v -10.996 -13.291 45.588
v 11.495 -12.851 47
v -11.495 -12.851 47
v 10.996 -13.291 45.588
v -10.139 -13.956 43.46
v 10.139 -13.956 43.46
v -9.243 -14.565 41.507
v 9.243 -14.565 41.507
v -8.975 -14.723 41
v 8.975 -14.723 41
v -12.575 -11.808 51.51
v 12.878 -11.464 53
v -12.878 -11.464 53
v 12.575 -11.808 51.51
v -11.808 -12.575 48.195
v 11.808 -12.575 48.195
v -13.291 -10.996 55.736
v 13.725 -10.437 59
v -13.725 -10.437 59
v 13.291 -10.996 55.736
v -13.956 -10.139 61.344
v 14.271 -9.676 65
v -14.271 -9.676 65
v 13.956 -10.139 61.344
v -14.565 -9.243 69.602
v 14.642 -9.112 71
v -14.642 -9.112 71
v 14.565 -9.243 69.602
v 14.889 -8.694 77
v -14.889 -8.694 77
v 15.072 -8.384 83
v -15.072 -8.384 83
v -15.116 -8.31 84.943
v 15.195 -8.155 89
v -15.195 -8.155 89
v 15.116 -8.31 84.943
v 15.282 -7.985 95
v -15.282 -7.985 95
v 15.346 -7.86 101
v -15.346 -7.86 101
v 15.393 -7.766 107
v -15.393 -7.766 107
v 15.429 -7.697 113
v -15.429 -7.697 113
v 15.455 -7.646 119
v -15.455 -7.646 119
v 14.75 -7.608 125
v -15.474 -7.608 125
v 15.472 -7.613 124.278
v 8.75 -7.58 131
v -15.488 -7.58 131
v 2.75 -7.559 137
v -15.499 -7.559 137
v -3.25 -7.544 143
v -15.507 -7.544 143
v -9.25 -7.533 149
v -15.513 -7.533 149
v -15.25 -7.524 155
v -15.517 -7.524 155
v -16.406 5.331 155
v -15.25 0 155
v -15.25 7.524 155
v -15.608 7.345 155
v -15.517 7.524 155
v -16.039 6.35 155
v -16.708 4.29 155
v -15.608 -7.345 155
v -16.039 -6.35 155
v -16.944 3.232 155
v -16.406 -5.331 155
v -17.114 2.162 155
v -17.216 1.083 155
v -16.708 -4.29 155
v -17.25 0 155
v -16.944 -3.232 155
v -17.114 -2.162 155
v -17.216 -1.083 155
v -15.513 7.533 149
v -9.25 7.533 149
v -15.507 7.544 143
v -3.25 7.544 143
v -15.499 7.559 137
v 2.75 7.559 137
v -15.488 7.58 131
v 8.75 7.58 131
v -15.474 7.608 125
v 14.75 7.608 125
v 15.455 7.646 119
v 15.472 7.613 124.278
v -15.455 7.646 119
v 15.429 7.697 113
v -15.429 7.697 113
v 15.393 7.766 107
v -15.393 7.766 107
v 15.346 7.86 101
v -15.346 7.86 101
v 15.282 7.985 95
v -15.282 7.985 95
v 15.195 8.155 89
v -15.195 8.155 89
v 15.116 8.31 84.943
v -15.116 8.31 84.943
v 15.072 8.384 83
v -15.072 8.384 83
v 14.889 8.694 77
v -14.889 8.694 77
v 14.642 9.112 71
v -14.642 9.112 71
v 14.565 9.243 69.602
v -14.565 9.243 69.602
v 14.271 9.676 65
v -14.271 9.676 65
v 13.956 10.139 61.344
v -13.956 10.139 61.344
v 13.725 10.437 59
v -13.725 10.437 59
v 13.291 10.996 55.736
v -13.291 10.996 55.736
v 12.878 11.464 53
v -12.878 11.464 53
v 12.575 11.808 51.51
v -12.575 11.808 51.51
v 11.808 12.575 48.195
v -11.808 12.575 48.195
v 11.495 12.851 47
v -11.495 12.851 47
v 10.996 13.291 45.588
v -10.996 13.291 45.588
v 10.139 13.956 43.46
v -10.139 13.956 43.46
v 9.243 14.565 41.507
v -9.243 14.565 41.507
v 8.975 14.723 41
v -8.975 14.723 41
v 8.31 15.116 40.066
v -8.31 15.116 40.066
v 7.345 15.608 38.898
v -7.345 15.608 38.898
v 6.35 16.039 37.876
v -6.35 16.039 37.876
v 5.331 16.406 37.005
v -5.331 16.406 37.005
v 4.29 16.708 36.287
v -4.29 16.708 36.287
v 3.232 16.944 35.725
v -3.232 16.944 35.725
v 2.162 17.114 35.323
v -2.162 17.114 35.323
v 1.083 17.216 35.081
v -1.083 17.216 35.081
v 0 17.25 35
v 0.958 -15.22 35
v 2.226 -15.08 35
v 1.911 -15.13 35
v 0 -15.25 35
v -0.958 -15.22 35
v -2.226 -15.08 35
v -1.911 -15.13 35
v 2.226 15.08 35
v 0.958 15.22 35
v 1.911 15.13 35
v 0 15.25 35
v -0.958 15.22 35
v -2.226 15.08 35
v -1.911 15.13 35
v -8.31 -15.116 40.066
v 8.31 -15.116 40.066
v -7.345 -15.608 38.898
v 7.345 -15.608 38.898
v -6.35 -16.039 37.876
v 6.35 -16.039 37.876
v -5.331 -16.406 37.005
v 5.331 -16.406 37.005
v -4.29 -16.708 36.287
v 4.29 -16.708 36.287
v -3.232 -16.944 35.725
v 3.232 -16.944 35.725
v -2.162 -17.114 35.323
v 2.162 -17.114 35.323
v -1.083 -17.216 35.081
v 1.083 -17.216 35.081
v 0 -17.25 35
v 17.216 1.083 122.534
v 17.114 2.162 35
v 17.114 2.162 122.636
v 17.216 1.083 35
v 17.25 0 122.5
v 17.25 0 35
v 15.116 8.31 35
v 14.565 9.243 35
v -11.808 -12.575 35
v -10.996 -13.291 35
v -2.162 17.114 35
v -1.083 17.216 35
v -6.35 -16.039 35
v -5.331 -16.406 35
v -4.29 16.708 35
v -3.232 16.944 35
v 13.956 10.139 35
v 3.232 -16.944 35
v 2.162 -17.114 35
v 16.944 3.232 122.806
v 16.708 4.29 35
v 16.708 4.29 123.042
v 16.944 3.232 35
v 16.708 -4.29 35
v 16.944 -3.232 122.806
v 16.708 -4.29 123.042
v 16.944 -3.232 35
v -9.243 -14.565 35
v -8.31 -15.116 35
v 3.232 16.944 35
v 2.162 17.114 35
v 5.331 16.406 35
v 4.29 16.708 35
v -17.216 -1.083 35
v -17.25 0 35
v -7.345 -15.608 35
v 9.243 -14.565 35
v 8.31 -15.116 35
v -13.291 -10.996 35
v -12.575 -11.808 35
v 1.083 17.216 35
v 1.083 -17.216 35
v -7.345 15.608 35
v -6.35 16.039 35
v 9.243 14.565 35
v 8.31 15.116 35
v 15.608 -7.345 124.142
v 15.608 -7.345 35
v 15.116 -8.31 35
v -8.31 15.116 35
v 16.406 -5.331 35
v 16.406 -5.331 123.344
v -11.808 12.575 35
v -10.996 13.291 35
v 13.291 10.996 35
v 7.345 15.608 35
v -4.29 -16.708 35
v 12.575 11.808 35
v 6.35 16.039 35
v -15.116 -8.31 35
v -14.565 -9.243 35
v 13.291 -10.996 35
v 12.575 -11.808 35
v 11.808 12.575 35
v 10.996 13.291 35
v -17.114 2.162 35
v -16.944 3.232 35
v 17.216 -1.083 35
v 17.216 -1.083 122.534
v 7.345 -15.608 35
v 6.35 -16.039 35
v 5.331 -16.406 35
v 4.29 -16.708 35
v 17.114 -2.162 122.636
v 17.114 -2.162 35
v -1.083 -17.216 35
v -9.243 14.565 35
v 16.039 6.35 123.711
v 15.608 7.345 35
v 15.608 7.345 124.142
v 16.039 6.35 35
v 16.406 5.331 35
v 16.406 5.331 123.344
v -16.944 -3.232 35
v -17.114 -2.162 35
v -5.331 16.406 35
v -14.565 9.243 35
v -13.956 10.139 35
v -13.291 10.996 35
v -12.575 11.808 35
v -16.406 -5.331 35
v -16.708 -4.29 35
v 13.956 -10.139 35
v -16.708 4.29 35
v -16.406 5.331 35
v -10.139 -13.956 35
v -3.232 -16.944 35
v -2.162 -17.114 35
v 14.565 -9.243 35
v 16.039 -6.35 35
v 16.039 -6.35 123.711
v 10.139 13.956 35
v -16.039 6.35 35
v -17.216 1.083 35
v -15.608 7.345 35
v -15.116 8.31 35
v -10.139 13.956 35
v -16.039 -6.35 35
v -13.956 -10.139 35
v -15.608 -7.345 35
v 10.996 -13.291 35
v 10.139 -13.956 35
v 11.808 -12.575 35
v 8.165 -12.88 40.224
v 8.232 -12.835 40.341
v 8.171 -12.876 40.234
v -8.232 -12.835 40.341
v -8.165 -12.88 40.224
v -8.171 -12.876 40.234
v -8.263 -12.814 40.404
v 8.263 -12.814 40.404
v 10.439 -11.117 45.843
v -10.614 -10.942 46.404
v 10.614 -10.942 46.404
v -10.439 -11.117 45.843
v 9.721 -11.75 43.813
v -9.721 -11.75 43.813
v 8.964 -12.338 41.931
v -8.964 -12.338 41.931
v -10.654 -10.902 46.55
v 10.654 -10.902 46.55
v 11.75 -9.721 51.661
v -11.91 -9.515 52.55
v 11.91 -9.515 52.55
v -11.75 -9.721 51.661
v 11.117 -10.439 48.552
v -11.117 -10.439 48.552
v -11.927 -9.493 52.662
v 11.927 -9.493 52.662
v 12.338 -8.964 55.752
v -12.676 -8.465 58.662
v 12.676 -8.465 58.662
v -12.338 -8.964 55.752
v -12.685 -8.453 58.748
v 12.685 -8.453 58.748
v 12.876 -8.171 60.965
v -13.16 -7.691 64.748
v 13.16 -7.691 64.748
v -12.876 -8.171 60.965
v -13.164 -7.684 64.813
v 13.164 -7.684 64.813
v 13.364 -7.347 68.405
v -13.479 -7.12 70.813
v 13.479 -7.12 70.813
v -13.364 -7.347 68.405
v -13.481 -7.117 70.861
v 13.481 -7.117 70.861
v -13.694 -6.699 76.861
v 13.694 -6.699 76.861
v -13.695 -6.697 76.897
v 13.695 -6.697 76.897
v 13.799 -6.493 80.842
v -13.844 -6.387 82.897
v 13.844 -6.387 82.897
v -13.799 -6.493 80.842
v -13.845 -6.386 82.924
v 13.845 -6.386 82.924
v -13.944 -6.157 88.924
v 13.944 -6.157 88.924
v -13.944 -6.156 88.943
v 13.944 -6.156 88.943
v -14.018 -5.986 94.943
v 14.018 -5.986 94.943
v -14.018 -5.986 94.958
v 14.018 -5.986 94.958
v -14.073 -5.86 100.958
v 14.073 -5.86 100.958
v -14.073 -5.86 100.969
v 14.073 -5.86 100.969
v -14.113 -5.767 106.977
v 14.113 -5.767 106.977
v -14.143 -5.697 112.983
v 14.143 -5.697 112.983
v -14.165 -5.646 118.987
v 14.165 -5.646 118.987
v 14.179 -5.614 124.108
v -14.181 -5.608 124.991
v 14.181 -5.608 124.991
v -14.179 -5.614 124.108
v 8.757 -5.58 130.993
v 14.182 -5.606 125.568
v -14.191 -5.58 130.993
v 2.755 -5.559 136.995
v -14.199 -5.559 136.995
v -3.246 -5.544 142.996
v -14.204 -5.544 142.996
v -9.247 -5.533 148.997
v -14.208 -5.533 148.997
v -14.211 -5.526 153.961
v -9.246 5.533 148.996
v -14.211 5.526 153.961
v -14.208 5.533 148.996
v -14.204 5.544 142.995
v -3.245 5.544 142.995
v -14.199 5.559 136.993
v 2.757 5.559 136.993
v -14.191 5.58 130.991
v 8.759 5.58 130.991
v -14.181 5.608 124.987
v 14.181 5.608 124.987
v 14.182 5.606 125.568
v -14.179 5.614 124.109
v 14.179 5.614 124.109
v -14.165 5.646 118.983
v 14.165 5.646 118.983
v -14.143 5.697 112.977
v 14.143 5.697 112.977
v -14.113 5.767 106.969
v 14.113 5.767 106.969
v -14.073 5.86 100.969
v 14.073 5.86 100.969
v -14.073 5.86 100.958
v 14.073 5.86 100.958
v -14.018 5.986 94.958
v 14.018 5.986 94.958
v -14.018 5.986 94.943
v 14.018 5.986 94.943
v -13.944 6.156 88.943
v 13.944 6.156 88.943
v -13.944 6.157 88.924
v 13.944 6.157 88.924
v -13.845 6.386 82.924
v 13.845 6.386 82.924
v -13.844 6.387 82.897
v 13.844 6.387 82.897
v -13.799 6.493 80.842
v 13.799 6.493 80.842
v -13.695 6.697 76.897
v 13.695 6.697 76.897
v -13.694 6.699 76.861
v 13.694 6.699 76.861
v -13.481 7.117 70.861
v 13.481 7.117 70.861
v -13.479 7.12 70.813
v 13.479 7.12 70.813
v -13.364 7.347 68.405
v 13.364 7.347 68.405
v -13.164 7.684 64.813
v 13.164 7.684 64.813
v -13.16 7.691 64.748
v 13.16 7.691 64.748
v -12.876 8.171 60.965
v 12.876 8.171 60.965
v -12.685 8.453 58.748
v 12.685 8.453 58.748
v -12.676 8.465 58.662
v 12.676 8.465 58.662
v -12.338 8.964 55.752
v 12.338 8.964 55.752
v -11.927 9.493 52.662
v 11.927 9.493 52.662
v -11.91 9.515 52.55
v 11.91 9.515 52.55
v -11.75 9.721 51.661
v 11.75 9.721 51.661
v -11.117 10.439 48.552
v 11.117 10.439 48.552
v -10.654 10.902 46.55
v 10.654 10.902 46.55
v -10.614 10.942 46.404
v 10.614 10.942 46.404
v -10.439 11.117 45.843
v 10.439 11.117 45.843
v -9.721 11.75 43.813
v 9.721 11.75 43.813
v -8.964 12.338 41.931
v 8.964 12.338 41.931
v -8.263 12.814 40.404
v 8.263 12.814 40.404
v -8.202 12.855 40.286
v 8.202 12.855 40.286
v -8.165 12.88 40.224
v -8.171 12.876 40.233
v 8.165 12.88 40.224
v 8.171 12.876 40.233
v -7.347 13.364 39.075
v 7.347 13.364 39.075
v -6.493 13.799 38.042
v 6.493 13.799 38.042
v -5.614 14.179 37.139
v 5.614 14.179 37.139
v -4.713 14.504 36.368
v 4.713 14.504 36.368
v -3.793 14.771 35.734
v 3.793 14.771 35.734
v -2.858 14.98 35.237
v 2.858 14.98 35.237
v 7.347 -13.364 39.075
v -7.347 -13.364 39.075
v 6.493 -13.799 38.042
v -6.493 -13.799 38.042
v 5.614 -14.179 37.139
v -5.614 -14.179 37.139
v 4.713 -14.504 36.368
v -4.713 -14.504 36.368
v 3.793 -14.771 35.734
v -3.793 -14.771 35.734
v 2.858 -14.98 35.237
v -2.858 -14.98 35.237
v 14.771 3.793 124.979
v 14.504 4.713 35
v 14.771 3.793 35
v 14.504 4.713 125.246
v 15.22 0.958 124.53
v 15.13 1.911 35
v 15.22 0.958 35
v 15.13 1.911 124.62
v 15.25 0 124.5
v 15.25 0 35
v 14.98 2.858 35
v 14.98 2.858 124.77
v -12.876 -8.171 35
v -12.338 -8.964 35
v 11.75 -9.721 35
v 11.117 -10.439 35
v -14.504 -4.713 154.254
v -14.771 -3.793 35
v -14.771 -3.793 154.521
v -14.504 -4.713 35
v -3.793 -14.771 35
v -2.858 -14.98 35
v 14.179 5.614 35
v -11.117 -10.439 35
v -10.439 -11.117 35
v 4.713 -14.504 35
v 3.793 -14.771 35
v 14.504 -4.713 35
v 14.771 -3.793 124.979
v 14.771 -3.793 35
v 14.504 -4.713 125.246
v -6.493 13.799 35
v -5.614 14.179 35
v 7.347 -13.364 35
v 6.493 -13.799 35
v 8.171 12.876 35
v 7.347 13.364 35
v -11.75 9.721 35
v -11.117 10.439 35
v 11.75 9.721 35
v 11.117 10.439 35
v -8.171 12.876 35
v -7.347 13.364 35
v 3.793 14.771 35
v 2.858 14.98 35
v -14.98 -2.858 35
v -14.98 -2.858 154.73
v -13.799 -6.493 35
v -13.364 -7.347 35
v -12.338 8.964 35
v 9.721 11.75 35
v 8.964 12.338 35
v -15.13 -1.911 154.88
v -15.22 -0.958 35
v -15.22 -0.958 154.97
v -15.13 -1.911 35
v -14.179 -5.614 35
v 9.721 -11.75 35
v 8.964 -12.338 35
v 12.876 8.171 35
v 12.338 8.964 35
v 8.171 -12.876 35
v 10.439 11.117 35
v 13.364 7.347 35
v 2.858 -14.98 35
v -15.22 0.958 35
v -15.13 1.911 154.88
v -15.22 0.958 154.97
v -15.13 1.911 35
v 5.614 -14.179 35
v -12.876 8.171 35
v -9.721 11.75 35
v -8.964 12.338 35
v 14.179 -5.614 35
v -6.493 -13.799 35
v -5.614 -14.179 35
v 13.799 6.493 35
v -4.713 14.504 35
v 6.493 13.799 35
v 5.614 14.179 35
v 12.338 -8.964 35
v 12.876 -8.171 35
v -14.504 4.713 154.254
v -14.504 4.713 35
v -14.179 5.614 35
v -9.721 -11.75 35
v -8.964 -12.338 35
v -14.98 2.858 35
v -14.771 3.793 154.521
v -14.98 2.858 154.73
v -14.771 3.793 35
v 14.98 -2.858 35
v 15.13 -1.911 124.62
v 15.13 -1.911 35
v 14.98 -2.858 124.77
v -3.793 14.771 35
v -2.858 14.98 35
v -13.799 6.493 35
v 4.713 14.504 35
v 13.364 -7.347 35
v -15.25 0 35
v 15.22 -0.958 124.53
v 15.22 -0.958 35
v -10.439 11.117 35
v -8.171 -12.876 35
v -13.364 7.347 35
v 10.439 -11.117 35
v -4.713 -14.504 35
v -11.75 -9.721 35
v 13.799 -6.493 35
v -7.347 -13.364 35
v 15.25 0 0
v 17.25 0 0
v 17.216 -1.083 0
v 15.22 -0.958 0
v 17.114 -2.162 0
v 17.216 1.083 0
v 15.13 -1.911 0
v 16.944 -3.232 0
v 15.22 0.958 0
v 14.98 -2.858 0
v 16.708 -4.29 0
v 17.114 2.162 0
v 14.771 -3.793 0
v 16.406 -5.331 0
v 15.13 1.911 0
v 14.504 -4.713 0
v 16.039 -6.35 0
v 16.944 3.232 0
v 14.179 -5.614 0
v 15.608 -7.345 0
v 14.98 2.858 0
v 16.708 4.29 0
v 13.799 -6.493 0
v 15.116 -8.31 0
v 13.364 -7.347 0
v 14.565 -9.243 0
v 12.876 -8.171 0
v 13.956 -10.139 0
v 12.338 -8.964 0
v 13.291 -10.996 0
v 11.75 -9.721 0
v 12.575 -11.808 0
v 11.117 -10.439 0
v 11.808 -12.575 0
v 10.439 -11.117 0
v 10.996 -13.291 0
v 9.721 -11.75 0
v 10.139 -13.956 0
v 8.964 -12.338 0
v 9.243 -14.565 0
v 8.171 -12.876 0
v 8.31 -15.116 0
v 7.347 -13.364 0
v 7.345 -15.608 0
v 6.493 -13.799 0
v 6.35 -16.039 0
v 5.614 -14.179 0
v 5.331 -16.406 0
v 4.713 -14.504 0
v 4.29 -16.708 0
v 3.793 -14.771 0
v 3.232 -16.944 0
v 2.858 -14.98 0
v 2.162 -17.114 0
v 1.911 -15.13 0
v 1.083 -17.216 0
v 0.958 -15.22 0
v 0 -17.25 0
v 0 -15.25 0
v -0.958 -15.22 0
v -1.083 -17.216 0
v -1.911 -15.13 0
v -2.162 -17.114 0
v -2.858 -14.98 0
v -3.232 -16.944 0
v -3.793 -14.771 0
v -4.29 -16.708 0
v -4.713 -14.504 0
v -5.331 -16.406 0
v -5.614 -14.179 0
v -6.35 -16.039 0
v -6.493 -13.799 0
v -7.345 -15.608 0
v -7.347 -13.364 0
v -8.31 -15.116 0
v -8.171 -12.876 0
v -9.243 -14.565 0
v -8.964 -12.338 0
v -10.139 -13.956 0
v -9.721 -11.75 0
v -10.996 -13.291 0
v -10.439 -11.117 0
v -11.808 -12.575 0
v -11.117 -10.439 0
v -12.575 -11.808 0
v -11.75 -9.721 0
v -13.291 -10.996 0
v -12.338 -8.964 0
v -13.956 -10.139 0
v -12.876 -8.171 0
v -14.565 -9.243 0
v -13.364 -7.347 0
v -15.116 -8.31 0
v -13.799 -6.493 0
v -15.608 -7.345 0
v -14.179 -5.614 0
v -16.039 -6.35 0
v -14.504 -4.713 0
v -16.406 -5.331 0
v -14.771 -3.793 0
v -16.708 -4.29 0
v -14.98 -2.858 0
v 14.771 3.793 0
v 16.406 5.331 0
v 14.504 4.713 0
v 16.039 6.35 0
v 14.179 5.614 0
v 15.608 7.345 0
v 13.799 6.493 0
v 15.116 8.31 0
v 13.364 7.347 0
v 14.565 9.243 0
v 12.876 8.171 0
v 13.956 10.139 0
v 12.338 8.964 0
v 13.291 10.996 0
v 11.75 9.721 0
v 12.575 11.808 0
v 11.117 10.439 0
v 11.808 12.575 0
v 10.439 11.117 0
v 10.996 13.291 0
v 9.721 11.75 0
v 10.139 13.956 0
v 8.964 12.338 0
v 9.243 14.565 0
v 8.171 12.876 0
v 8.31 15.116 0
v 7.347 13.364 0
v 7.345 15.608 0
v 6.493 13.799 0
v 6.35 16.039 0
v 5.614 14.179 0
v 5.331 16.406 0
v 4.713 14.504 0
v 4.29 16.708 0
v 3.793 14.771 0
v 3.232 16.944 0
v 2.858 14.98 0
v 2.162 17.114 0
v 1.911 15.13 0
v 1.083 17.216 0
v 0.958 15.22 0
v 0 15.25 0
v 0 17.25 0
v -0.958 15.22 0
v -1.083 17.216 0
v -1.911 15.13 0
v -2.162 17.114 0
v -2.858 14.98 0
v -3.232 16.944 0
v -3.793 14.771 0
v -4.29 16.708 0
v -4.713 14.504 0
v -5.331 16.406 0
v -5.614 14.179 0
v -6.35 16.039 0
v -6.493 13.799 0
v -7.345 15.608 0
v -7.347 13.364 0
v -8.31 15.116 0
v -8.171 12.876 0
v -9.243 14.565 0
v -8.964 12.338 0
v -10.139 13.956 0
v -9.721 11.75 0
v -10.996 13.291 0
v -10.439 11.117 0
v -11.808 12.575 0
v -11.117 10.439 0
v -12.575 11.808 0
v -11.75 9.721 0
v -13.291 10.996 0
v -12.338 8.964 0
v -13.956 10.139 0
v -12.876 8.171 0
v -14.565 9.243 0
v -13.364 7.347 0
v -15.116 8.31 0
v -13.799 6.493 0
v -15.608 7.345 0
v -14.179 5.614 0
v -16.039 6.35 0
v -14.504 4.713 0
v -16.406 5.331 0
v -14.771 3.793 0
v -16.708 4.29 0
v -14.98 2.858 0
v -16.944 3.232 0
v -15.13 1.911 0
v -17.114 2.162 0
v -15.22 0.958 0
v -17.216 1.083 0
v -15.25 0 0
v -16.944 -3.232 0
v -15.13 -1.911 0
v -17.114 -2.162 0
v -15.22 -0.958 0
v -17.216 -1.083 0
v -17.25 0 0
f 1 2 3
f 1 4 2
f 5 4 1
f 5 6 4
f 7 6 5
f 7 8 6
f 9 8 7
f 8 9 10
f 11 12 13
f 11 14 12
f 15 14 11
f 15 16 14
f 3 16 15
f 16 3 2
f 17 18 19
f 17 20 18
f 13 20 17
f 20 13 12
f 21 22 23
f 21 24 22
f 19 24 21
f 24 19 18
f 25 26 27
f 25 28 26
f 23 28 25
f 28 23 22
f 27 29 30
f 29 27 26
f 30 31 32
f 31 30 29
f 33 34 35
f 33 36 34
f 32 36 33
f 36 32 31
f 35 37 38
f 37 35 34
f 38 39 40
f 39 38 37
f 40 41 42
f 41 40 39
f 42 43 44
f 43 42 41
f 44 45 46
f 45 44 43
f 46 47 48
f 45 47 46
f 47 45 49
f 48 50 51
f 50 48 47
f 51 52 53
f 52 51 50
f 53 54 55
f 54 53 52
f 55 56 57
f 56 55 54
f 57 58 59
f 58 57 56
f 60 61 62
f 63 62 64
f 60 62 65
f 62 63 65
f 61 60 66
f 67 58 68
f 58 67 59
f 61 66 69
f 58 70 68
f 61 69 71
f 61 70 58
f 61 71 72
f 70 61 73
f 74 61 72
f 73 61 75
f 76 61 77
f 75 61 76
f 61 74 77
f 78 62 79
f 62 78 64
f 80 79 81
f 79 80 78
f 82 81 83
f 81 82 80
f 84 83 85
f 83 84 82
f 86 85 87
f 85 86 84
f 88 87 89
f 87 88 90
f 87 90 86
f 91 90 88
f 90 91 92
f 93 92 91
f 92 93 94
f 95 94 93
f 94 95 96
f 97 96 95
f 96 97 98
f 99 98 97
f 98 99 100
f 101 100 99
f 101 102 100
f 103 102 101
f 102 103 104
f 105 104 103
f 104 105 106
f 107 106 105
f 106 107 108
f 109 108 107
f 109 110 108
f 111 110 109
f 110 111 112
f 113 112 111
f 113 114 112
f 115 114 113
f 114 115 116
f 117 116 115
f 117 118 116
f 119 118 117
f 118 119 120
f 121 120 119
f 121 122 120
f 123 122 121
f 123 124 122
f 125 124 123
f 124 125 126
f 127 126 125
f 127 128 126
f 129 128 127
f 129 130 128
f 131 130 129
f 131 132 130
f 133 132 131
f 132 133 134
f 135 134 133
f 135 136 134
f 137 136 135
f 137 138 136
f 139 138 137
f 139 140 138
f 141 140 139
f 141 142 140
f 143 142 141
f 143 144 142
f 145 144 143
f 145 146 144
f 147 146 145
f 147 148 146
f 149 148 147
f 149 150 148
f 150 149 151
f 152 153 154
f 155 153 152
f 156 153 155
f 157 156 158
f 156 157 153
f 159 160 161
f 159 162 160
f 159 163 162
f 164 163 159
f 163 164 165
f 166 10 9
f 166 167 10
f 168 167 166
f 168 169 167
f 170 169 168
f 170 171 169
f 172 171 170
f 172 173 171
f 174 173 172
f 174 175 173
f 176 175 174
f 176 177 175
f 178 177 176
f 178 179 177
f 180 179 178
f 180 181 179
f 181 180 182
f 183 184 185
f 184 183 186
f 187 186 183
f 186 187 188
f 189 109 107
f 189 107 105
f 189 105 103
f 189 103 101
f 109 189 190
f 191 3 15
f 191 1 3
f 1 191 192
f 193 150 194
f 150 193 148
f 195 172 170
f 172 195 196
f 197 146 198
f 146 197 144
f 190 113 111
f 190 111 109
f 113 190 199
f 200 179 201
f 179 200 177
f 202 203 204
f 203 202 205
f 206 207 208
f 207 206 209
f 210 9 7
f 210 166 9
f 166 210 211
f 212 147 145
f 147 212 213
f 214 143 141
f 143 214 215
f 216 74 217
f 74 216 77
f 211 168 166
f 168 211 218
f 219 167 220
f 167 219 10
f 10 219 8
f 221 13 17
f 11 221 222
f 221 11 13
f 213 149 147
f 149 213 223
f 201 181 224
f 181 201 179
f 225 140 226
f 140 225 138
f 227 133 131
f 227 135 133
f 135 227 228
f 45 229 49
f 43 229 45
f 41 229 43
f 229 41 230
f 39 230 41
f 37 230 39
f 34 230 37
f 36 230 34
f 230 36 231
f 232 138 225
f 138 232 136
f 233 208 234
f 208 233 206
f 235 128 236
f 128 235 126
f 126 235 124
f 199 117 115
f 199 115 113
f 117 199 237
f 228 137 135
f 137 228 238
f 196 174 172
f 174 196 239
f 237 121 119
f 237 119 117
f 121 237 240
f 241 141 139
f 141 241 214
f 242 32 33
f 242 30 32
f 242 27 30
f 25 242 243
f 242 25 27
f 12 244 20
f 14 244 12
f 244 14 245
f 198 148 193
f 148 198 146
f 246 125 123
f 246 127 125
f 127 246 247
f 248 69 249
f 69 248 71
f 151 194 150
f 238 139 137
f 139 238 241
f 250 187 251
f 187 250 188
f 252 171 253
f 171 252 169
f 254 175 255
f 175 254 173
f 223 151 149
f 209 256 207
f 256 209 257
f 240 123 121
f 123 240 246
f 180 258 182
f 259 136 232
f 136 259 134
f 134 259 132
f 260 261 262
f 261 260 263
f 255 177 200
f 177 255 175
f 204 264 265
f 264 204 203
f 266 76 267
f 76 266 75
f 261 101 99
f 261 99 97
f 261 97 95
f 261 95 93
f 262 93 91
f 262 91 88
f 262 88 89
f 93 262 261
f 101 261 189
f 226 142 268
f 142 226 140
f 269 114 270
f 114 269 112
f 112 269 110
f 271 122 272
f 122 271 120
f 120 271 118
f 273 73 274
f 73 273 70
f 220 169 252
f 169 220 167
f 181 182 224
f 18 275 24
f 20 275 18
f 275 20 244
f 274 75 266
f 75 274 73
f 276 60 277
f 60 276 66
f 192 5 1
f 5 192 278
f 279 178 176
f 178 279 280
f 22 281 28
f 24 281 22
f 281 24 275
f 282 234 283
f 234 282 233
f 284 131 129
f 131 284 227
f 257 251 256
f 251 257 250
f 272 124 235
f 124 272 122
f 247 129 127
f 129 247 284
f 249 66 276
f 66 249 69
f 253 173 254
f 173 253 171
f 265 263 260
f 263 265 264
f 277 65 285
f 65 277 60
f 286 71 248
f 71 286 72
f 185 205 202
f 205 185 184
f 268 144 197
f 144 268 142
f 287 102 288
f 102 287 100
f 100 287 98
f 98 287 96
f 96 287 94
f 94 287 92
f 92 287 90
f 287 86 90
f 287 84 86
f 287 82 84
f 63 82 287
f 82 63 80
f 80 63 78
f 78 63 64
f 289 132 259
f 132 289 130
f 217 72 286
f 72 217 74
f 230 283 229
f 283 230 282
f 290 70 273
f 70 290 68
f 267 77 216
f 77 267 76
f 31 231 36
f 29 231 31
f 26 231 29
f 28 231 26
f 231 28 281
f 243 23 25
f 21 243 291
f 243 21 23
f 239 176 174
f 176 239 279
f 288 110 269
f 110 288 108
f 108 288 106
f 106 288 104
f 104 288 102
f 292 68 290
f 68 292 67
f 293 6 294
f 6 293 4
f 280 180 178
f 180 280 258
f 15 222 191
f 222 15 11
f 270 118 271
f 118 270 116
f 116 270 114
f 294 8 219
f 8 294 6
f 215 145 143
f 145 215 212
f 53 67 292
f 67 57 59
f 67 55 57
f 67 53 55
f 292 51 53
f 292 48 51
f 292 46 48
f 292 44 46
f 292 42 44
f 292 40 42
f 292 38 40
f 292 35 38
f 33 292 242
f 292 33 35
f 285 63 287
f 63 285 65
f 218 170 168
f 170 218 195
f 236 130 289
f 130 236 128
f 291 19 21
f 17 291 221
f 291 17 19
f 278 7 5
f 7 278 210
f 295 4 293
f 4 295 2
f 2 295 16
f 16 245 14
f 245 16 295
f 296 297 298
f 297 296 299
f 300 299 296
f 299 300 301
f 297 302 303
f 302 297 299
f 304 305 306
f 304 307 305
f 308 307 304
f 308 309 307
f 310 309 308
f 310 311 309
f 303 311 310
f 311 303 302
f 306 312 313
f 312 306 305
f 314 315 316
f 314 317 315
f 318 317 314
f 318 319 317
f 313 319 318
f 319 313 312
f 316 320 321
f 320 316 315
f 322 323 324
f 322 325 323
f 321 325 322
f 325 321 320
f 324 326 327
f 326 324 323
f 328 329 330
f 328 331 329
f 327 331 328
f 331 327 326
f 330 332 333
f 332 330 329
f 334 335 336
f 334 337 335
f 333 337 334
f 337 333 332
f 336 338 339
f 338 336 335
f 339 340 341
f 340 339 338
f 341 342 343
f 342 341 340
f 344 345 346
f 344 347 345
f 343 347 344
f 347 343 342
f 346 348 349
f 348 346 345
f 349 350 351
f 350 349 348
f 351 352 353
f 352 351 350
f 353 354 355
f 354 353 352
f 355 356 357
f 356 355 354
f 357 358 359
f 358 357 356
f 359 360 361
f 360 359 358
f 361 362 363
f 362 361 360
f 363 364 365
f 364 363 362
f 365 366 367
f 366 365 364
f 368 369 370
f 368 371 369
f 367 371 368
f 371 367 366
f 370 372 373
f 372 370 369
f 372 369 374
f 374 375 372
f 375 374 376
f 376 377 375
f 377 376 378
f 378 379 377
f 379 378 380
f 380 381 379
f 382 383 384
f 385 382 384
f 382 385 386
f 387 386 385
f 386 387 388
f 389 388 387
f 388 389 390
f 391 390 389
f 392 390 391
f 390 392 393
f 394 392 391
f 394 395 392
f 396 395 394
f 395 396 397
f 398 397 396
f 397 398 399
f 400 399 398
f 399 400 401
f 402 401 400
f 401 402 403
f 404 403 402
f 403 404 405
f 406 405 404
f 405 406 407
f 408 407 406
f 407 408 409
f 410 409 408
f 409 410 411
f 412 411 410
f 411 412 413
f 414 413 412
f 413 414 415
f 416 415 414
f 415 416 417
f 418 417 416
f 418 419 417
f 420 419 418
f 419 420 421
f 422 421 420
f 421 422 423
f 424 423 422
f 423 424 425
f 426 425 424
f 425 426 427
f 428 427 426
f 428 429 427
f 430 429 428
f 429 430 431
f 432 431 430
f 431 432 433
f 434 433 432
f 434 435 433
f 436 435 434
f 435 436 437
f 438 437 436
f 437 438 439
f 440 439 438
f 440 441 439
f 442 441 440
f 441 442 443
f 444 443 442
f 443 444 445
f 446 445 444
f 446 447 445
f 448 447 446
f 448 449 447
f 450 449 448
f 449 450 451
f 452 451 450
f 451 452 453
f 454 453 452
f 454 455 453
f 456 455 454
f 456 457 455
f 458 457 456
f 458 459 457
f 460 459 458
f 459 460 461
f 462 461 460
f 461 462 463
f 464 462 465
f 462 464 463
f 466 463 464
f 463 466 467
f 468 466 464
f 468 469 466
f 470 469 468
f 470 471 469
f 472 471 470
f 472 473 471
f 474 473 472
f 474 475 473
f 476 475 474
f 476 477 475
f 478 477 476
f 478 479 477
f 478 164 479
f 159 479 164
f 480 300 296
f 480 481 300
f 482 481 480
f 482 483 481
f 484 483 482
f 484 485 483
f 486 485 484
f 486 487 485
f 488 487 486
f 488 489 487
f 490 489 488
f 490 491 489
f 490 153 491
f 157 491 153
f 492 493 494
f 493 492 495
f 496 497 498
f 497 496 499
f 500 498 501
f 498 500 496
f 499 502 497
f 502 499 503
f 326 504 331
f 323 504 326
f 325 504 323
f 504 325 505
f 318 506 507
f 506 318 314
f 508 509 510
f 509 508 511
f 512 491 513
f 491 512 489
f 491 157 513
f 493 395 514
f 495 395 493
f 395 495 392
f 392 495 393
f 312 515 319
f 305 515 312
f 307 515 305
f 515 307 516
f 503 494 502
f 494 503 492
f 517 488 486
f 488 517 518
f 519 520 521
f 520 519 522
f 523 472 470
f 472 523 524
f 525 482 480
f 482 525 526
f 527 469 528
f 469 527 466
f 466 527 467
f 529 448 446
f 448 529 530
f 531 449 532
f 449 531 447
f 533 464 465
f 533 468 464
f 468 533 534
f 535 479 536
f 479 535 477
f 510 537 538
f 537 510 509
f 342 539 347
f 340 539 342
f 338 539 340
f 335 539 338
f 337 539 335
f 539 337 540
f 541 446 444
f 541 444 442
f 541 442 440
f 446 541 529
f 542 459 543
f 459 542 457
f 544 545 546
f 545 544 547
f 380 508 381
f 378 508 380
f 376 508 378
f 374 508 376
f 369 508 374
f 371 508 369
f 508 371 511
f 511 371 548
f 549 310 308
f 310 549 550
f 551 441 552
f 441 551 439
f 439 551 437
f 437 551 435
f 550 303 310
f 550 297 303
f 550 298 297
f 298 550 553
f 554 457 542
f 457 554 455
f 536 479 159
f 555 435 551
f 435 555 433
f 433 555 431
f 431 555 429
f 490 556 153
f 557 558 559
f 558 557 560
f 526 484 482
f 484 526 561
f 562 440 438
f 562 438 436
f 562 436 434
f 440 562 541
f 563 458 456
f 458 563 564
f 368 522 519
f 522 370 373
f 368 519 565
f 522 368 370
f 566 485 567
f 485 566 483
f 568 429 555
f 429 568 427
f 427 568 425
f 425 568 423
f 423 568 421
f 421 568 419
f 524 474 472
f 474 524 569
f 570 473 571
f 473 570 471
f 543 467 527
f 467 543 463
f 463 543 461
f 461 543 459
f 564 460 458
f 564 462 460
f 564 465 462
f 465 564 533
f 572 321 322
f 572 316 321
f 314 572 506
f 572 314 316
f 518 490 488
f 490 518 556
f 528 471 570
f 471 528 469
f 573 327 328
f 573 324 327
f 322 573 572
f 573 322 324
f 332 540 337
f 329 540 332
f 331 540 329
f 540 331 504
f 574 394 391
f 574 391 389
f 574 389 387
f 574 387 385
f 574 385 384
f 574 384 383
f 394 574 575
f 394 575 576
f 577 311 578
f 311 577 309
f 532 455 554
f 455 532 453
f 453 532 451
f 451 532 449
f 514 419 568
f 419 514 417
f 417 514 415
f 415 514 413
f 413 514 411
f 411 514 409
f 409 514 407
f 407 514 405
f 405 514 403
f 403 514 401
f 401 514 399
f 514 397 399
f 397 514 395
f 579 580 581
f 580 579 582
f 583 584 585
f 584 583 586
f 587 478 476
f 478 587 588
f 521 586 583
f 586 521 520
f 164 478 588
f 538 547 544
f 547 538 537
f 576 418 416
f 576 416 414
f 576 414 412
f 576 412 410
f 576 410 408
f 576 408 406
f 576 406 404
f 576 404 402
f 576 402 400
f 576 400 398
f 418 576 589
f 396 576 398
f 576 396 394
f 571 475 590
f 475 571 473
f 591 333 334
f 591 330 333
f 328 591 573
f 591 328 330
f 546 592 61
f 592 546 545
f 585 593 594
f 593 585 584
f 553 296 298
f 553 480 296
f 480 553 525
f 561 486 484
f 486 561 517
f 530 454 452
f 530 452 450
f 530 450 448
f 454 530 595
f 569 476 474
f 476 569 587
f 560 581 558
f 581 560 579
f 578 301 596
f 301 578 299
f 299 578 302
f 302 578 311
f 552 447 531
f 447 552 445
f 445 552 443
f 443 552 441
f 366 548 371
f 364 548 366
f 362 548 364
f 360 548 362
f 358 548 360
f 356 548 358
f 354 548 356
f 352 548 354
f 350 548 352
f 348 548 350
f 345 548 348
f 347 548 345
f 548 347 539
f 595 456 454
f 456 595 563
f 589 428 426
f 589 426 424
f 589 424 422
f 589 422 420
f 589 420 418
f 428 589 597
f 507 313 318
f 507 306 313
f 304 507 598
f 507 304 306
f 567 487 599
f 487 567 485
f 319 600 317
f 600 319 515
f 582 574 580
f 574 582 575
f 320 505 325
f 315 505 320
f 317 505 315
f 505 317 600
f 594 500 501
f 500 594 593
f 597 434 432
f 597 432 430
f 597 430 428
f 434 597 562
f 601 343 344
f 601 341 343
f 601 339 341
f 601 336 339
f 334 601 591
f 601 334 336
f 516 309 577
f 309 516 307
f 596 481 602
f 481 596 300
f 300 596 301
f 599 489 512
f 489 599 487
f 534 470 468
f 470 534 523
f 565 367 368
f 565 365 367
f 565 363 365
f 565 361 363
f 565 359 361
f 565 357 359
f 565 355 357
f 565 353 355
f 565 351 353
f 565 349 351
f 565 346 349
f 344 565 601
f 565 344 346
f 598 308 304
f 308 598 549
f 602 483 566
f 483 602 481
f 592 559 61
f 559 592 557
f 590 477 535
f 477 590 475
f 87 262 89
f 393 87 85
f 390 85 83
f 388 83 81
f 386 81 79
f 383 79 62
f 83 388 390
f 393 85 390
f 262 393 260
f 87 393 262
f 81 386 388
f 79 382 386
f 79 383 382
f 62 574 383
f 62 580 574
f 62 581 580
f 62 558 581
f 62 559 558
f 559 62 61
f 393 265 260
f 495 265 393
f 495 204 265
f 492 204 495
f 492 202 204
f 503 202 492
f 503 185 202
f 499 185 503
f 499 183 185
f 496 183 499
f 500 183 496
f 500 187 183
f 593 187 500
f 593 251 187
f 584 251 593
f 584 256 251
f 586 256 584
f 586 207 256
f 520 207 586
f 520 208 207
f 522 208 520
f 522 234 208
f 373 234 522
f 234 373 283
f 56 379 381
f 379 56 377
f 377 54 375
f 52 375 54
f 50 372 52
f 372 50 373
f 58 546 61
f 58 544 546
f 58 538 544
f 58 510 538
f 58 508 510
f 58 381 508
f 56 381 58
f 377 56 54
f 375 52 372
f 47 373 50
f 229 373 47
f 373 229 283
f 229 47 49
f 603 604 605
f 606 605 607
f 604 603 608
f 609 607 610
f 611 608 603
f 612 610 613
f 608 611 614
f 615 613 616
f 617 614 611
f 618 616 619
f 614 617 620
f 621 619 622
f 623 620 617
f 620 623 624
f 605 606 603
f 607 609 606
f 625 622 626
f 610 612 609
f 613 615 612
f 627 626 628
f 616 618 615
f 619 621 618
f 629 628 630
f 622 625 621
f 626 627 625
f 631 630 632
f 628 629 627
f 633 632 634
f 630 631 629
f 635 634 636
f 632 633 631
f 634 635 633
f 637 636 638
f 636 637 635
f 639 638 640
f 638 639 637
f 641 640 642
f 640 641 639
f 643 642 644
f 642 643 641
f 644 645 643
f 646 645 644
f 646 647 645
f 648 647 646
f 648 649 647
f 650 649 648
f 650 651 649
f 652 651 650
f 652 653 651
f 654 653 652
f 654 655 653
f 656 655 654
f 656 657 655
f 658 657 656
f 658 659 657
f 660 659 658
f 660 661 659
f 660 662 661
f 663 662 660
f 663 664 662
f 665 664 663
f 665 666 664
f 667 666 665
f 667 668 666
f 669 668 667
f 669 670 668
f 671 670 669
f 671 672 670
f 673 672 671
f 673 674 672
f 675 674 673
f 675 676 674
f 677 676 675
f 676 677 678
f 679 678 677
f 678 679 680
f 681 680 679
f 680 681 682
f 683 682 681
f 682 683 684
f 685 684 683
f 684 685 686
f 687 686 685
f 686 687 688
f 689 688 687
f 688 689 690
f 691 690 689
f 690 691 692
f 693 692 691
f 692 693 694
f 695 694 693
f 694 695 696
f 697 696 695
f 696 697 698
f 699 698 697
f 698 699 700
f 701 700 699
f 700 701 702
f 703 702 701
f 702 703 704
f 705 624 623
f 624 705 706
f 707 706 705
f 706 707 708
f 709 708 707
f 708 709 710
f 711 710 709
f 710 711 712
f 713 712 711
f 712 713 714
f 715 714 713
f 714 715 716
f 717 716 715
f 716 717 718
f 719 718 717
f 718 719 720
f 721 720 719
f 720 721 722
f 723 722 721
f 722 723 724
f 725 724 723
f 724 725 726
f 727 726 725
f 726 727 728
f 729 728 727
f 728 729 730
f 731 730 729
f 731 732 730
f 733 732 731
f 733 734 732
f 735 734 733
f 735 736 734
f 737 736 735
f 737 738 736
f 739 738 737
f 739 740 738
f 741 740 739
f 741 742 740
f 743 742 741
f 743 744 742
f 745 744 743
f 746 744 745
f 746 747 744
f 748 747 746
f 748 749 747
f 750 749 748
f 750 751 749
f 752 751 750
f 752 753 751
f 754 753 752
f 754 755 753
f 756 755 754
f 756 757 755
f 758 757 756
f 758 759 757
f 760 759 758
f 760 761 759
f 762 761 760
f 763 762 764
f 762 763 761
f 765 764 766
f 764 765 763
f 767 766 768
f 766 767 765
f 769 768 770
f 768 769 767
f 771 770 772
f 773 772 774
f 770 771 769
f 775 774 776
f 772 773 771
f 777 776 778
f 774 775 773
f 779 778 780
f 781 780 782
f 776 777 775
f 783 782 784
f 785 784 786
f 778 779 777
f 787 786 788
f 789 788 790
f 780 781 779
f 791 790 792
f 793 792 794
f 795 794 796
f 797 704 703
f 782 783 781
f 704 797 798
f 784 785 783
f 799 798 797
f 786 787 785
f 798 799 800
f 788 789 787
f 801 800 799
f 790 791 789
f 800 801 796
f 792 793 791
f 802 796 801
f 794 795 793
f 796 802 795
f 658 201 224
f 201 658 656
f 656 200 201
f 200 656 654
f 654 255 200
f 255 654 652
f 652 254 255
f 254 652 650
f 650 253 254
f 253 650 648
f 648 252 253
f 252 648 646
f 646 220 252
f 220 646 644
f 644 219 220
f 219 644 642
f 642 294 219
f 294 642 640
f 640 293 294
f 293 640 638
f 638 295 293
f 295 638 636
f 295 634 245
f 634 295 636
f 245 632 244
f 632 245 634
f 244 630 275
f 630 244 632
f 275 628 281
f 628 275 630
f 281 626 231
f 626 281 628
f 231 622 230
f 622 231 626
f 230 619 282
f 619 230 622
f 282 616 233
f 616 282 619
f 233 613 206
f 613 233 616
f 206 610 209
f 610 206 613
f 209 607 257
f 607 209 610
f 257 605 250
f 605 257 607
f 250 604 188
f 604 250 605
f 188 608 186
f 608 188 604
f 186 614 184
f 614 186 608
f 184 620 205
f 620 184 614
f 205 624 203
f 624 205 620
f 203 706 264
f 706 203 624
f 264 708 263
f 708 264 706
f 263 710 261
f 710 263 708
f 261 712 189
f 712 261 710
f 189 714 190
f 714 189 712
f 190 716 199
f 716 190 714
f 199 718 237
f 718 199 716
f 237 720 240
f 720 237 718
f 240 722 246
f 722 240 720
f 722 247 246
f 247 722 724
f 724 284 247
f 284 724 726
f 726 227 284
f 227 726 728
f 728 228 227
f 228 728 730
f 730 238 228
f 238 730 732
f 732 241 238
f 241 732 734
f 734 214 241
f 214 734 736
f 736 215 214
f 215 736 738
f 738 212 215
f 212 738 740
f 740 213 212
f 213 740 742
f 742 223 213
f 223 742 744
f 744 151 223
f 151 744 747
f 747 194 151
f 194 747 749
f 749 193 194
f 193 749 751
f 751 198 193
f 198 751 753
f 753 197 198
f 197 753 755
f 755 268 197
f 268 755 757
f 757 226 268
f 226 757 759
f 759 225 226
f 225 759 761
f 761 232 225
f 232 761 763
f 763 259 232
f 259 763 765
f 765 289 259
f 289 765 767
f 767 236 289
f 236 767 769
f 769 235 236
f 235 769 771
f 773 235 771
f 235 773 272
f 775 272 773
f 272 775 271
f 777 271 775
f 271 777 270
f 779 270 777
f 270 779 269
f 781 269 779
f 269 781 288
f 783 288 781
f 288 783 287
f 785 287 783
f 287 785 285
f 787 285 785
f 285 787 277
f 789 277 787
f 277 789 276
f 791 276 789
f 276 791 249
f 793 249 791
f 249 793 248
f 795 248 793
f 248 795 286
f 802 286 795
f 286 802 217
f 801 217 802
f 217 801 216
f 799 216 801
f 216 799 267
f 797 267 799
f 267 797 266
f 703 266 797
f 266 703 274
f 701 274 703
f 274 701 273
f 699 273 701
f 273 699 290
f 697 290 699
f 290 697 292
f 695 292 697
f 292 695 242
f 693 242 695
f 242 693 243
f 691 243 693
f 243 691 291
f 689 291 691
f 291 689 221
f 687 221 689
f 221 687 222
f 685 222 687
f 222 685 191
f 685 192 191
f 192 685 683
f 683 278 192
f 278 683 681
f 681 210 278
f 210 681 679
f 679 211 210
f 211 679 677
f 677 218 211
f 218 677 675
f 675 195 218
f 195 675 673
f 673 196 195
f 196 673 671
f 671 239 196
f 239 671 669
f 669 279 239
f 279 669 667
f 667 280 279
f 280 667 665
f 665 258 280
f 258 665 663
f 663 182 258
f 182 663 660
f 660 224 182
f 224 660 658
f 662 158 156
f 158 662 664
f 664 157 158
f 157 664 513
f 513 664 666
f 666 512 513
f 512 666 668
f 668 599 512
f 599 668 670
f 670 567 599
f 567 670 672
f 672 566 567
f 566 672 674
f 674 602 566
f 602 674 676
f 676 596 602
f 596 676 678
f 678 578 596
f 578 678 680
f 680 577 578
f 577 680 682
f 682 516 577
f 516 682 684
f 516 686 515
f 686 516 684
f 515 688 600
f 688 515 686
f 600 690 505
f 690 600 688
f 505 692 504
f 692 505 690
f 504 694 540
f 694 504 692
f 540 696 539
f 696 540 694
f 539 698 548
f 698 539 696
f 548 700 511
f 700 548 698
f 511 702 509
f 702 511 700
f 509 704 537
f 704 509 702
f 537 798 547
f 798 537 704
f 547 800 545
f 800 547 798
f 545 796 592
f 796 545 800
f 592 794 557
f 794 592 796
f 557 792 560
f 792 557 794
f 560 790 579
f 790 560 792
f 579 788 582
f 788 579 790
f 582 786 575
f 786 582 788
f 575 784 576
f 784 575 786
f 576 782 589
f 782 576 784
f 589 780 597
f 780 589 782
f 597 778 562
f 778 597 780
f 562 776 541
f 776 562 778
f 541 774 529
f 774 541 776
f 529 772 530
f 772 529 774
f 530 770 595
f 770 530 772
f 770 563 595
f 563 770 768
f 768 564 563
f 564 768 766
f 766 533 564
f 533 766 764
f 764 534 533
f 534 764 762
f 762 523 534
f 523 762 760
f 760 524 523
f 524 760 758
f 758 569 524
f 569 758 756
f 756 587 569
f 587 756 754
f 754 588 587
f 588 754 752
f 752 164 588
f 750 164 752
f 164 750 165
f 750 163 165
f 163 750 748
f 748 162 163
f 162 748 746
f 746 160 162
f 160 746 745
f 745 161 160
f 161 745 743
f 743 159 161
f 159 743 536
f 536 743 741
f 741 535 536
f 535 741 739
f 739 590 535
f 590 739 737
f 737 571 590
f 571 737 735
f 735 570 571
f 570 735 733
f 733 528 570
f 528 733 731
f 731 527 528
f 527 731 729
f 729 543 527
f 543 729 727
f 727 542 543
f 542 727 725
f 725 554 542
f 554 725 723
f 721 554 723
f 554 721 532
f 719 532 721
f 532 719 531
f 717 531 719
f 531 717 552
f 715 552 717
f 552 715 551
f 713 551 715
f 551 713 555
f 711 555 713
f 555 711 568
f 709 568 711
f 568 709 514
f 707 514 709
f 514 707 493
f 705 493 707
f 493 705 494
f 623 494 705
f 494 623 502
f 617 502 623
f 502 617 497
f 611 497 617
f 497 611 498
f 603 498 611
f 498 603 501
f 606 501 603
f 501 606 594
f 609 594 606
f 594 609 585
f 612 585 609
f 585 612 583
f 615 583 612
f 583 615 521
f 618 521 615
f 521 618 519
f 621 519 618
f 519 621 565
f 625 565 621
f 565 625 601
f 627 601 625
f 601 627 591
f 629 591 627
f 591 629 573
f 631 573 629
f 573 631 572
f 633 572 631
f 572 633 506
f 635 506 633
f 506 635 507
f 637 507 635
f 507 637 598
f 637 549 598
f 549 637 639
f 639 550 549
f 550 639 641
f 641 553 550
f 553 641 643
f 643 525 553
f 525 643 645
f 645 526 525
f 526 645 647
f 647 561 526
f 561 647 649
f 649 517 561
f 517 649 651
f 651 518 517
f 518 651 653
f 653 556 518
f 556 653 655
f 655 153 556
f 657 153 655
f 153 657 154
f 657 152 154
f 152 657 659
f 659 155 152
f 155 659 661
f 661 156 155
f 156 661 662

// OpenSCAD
$fn = 100;
mm = 1;
e = 2.71828;
eps = 0.1 * mm;

attachment_outer_dia = 34.5 * mm;
attachment_height = 35 * mm;
wall_width = 2 * mm;

taper_height = 120 * mm;
nozzle_width = 15 * mm;
nozzle_angle = 45;

attachment_inner_dia = attachment_outer_dia - 2 * wall_width;
total_height = attachment_height + taper_height;

taper_steps = 20;

function taper_point(x, y) = [
    x * taper_height, y *(nozzle_width / 2 + (attachment_outer_dia - nozzle_width) / 2 * (e ^ -(6 * x)))
];

module taper_profile()
{
    taper_points = [
        for (i = [0:taper_steps]) taper_point(i / taper_steps, 1),
        for (i = [0:taper_steps]) taper_point((taper_steps - i) / taper_steps, -1),
    ];
    echo(taper_points);
    polygon(taper_points);
}

module nozzle()
{
    difference()
    {
        intersection()
        {
            translate([ attachment_outer_dia / 2, 0, 0 ]) rotate([ 0, -90, 0 ]) linear_extrude(attachment_outer_dia)
                taper_profile();
            cylinder(d = attachment_outer_dia, h = taper_height);
        }
        intersection()
        {
            translate([ attachment_inner_dia / 2, 0, 0 ]) rotate([ 0, -90, 0 ]) linear_extrude(attachment_inner_dia)
                offset(r = -wall_width)
            {
                taper_profile();
                translate([ -wall_width - eps, -attachment_outer_dia / 2 ])
                    square([ wall_width + 2 * eps, attachment_outer_dia ]);
                translate([ taper_height - eps, -nozzle_width / 2 ]) square([ wall_width + 2 * eps, nozzle_width ]);
            }
            cylinder(d = attachment_inner_dia, h = taper_height);
        }

        translate([ -attachment_outer_dia / 2, 0, taper_height ]) hull()
        {
            translate([ wall_width, -attachment_outer_dia / 2, 0 ])
                cube([ wall_width, attachment_outer_dia, taper_height ]);
            translate([
                attachment_outer_dia, -attachment_outer_dia / 2,
                -(attachment_outer_dia - wall_width) * tan(nozzle_angle)
            ]) cube([ wall_width, attachment_outer_dia, taper_height ]);
        }
    }
}

module vacuum_nozzle()
{
    linear_extrude(attachment_height) difference()
    {
        circle(d = attachment_outer_dia);
        circle(d = attachment_inner_dia);
    }
    translate([ 0, 0, attachment_height ]) nozzle();
}

vacuum_nozzle();
